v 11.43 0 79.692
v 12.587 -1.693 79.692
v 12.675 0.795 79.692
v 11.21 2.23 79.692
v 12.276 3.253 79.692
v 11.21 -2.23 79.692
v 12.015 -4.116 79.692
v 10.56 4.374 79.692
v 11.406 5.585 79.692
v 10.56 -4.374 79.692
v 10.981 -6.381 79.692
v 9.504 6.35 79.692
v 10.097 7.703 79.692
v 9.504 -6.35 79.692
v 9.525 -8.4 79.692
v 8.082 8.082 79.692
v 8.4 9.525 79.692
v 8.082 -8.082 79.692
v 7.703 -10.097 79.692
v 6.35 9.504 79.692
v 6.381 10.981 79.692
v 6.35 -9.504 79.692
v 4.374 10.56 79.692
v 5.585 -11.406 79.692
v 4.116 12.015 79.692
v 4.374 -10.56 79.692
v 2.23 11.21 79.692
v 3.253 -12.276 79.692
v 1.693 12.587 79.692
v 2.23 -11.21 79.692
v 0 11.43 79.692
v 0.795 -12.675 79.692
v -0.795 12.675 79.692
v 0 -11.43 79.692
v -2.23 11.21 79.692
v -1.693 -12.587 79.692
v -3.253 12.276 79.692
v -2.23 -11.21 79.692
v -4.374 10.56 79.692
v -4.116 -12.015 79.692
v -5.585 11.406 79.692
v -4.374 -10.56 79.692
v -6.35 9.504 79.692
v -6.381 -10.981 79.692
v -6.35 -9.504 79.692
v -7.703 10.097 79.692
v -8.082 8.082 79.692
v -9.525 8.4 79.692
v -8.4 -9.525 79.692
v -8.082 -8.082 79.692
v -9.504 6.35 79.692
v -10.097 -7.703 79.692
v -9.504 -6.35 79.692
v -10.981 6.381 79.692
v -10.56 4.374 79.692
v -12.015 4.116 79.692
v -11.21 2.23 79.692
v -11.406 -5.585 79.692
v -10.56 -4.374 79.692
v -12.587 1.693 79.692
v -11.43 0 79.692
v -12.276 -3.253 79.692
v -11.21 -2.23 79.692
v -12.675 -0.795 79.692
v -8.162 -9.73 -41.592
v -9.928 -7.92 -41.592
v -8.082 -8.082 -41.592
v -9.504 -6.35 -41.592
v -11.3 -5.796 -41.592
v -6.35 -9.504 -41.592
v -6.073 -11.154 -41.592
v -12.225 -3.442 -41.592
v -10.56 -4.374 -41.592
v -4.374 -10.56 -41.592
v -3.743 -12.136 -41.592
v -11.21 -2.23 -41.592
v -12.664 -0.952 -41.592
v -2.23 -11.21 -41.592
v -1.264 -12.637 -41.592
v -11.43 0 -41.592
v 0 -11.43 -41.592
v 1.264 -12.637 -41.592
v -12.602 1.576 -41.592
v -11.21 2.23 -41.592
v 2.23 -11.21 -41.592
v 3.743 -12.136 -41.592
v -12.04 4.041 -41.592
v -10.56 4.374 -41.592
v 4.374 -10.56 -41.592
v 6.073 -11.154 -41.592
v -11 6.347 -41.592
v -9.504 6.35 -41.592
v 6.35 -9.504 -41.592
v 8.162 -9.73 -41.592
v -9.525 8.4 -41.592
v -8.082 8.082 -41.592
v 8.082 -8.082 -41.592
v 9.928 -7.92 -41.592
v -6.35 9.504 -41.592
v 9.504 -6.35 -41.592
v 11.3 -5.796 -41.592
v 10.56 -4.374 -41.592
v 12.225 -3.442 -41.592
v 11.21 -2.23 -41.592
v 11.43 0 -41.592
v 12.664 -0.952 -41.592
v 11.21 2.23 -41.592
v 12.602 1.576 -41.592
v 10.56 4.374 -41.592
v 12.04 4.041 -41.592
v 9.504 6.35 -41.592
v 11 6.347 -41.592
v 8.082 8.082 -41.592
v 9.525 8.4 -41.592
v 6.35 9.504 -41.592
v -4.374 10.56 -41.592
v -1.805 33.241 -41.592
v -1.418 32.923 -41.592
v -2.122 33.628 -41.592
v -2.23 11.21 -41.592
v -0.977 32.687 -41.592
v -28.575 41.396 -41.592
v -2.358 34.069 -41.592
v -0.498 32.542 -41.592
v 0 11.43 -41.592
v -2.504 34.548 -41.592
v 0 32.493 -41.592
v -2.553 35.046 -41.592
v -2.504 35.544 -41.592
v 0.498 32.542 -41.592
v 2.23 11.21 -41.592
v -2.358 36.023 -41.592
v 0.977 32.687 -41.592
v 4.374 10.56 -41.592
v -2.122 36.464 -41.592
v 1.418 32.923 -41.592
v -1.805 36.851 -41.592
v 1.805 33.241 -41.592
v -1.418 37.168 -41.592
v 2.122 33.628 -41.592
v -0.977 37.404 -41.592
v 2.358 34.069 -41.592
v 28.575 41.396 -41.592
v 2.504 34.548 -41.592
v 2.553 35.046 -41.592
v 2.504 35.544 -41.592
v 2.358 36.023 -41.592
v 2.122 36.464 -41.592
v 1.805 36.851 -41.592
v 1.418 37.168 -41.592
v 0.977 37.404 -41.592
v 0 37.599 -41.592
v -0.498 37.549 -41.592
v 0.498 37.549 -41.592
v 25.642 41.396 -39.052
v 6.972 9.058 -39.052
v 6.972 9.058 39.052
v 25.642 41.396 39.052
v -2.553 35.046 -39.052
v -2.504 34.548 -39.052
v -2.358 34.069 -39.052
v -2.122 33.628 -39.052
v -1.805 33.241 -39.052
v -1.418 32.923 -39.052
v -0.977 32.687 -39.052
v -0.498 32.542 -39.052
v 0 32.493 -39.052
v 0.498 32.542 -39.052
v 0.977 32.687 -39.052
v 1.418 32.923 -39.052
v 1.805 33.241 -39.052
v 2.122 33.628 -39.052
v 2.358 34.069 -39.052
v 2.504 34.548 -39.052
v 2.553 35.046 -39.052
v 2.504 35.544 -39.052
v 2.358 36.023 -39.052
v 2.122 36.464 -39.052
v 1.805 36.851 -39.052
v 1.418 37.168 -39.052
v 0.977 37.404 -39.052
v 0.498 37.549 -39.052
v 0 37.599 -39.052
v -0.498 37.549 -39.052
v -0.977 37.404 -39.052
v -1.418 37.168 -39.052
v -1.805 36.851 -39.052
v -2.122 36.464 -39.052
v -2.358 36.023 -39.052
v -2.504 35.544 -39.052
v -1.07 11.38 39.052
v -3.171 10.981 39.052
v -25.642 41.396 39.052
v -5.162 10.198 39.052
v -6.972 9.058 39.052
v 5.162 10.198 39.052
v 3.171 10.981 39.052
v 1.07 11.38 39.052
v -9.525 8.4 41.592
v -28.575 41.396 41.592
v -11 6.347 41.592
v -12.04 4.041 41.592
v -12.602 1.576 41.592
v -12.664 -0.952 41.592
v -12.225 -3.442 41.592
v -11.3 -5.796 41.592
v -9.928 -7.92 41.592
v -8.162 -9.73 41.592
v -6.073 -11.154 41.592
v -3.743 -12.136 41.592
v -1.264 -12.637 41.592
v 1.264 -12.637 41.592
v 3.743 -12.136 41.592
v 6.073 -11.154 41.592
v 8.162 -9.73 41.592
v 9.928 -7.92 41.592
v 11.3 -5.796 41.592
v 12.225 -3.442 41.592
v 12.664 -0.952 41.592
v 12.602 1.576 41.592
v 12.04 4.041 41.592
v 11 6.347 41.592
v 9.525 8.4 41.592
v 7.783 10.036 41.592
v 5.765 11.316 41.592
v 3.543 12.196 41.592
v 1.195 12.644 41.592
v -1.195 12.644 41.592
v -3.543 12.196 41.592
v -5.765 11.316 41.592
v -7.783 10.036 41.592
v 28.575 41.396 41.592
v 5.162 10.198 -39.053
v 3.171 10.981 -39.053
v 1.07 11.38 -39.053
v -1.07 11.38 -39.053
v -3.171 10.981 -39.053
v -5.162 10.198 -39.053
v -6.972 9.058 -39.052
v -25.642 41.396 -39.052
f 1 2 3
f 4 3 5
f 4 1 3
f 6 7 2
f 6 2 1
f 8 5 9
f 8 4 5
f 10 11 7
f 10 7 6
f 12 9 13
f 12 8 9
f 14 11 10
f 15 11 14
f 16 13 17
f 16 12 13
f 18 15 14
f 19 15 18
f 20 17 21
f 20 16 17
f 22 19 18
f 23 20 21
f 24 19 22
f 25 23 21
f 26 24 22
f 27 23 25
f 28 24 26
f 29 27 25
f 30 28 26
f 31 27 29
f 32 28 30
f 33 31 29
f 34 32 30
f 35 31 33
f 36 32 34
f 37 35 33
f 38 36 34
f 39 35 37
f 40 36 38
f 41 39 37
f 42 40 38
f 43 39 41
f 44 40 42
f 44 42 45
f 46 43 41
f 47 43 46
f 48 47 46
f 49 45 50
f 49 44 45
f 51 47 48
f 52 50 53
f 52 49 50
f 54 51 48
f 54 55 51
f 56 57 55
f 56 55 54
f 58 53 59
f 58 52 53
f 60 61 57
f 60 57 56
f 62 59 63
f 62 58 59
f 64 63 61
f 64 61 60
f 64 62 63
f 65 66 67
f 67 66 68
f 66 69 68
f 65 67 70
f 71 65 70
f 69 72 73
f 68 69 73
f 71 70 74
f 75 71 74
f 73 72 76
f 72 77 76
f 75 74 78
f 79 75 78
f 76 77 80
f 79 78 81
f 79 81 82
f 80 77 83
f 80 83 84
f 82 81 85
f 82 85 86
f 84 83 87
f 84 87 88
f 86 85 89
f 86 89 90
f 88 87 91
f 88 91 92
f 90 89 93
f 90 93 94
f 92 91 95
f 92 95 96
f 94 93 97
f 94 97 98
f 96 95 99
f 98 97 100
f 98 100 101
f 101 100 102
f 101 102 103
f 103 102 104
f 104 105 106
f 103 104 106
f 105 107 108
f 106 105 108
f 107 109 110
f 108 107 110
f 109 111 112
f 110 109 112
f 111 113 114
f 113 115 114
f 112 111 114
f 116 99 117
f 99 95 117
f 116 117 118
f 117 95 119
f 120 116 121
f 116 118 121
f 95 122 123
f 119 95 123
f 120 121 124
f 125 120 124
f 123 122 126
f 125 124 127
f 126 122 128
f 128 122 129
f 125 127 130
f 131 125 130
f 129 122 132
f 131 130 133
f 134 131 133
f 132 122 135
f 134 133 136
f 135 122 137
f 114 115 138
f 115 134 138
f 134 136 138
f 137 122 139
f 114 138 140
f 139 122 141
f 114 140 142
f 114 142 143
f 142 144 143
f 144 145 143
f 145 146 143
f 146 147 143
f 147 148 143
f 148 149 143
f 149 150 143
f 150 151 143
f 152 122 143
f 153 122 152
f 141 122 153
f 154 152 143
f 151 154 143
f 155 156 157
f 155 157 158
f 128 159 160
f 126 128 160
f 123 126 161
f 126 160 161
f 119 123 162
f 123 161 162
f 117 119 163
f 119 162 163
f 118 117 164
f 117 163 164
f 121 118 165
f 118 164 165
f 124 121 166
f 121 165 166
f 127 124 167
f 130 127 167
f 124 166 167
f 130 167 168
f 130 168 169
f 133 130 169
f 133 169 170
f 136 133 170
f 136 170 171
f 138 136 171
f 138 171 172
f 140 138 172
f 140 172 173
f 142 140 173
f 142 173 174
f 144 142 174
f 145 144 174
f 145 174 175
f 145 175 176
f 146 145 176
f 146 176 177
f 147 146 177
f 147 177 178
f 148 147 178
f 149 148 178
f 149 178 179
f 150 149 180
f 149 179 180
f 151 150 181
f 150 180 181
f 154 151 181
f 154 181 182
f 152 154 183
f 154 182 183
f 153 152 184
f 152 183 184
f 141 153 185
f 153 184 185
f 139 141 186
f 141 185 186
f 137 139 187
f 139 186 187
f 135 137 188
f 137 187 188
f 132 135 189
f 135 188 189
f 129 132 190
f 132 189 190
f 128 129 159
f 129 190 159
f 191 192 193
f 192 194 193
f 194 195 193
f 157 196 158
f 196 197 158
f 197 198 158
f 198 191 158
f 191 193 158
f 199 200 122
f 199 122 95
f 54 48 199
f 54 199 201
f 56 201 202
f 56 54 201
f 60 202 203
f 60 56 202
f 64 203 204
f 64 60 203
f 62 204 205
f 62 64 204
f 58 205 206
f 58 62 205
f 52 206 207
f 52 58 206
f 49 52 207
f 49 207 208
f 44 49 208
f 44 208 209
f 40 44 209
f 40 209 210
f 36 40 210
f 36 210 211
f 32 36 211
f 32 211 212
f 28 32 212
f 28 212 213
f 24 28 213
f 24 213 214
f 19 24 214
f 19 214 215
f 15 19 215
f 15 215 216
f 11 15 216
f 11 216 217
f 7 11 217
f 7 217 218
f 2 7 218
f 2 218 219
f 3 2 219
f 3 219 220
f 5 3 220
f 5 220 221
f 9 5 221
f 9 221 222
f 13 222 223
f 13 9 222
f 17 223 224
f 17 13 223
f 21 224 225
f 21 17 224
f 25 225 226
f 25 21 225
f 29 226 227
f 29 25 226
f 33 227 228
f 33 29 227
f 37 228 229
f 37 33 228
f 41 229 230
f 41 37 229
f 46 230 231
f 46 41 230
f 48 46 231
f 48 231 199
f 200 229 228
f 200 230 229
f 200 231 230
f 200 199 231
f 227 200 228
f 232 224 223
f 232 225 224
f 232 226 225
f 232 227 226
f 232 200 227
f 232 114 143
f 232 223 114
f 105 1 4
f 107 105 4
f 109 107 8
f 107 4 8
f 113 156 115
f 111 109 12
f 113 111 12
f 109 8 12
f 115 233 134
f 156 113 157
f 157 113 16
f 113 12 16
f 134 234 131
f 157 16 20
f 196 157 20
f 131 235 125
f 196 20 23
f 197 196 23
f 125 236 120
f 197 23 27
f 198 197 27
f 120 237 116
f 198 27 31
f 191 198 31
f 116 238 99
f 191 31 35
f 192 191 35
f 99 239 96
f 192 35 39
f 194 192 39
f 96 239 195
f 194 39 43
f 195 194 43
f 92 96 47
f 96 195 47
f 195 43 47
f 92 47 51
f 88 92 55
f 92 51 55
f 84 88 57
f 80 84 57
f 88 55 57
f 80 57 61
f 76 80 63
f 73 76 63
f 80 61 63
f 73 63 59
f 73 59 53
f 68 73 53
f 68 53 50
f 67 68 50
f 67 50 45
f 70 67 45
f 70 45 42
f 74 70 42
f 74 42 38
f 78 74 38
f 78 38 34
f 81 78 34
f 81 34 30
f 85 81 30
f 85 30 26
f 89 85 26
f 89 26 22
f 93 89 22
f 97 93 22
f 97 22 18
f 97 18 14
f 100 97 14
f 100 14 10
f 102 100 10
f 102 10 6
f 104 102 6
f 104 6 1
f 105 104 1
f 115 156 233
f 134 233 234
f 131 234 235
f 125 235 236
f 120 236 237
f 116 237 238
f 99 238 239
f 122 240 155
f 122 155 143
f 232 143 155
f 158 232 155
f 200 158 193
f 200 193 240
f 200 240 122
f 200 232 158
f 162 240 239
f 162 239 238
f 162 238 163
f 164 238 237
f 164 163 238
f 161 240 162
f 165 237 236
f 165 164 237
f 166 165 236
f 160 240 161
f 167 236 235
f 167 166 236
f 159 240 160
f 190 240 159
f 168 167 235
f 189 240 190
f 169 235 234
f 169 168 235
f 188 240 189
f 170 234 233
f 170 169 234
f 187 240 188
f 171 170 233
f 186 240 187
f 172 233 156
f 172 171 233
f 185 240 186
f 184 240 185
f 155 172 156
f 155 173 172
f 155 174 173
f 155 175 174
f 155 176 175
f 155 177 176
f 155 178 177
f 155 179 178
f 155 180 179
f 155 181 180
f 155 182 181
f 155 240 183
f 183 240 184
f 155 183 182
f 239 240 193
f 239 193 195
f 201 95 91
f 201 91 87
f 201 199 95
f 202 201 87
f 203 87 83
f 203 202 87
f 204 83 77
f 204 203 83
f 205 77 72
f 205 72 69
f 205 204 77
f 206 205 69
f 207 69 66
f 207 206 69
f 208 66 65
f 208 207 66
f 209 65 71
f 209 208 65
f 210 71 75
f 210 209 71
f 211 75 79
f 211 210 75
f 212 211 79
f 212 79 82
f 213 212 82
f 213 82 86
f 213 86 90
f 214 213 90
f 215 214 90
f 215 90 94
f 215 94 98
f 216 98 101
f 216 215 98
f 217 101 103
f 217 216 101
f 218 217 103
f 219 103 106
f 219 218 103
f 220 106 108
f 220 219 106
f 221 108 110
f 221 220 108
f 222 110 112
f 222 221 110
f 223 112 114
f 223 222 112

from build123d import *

# Parameters (mm, degrees)
BOSS_EXTRUDE1_DEPTH         = 41.5925
SHELL1_START                = -39.0525
SHELL1_DEPTH                = 78.105
BOSS_EXTRUDE2_START         = 38.1
SKETCH3_R                   = 12.7
BOSS_EXTRUDE2_DEPTH         = 38.1
SKETCH4_R                   = 11.43
CUT_EXTRUDE1_DEPTH          = 132.301928586
F_1_4_20_TAPPED_HOLE1_D     = 5.1054
F_1_4_20_TAPPED_HOLE1_DEPTH = 2.54


# Read off the part's stored shape, not the designer's step: Shell1
with BuildPart() as part:
    # Sketch2 → Boss-Extrude1 (new, symmetric)
    with BuildSketch(Plane.XY):
        with BuildLine():
            Line((9.525, 8.400260413), (28.575, 41.395828297))
            Line((28.575, 41.395828297), (-28.575, 41.395828297))
            Line((-28.575, 41.395828297), (-9.525, 8.400260413))
            ThreePointArc((-9.525, 8.400260413), (0, -12.7), (9.525, 8.400260413))
        make_face()
    extrude(amount=BOSS_EXTRUDE1_DEPTH, both=True)

    # Shell1 outline → Shell1 (cut)
    with BuildSketch(Plane.XY.offset(SHELL1_START)):
        with BuildLine():
            ThreePointArc((-6.330300915, 7.946879282), (0, -10.16), (6.330300915, 7.946879282))
            Line((6.330300915, 7.946879282), (25.642060633, 41.395828297))
            Line((25.642060633, 41.395828297), (-25.642060633, 41.395828297))
            Line((-25.642060633, 41.395828297), (-6.330300915, 7.946879282))
        make_face()
    extrude(amount=SHELL1_DEPTH, mode=Mode.SUBTRACT)

    # Sketch3 → Boss-Extrude2 (add)
    with BuildSketch(Plane.XY.offset(41.5925).offset(BOSS_EXTRUDE2_START)):
        with Locations(Location((0, 0, 0), (0, 0, 138.590377891))):
            Circle(SKETCH3_R)
    extrude(amount=-BOSS_EXTRUDE2_DEPTH)

    # Sketch4 → Cut-Extrude1 (cut, through all)
    with BuildSketch(Plane.XY.offset(79.6925)):
        Circle(SKETCH4_R)
    extrude(amount=-CUT_EXTRUDE1_DEPTH, mode=Mode.SUBTRACT)

    # 1/4-20 Tapped Hole1
    with Locations(Plane(origin=(0, 0, -41.5925), x_dir=(1, 0, 0), z_dir=(0, 0, -1))):
        with Locations((0, -35.045828297)):
            Hole(F_1_4_20_TAPPED_HOLE1_D / 2, depth=F_1_4_20_TAPPED_HOLE1_DEPTH)


solid = part.part
